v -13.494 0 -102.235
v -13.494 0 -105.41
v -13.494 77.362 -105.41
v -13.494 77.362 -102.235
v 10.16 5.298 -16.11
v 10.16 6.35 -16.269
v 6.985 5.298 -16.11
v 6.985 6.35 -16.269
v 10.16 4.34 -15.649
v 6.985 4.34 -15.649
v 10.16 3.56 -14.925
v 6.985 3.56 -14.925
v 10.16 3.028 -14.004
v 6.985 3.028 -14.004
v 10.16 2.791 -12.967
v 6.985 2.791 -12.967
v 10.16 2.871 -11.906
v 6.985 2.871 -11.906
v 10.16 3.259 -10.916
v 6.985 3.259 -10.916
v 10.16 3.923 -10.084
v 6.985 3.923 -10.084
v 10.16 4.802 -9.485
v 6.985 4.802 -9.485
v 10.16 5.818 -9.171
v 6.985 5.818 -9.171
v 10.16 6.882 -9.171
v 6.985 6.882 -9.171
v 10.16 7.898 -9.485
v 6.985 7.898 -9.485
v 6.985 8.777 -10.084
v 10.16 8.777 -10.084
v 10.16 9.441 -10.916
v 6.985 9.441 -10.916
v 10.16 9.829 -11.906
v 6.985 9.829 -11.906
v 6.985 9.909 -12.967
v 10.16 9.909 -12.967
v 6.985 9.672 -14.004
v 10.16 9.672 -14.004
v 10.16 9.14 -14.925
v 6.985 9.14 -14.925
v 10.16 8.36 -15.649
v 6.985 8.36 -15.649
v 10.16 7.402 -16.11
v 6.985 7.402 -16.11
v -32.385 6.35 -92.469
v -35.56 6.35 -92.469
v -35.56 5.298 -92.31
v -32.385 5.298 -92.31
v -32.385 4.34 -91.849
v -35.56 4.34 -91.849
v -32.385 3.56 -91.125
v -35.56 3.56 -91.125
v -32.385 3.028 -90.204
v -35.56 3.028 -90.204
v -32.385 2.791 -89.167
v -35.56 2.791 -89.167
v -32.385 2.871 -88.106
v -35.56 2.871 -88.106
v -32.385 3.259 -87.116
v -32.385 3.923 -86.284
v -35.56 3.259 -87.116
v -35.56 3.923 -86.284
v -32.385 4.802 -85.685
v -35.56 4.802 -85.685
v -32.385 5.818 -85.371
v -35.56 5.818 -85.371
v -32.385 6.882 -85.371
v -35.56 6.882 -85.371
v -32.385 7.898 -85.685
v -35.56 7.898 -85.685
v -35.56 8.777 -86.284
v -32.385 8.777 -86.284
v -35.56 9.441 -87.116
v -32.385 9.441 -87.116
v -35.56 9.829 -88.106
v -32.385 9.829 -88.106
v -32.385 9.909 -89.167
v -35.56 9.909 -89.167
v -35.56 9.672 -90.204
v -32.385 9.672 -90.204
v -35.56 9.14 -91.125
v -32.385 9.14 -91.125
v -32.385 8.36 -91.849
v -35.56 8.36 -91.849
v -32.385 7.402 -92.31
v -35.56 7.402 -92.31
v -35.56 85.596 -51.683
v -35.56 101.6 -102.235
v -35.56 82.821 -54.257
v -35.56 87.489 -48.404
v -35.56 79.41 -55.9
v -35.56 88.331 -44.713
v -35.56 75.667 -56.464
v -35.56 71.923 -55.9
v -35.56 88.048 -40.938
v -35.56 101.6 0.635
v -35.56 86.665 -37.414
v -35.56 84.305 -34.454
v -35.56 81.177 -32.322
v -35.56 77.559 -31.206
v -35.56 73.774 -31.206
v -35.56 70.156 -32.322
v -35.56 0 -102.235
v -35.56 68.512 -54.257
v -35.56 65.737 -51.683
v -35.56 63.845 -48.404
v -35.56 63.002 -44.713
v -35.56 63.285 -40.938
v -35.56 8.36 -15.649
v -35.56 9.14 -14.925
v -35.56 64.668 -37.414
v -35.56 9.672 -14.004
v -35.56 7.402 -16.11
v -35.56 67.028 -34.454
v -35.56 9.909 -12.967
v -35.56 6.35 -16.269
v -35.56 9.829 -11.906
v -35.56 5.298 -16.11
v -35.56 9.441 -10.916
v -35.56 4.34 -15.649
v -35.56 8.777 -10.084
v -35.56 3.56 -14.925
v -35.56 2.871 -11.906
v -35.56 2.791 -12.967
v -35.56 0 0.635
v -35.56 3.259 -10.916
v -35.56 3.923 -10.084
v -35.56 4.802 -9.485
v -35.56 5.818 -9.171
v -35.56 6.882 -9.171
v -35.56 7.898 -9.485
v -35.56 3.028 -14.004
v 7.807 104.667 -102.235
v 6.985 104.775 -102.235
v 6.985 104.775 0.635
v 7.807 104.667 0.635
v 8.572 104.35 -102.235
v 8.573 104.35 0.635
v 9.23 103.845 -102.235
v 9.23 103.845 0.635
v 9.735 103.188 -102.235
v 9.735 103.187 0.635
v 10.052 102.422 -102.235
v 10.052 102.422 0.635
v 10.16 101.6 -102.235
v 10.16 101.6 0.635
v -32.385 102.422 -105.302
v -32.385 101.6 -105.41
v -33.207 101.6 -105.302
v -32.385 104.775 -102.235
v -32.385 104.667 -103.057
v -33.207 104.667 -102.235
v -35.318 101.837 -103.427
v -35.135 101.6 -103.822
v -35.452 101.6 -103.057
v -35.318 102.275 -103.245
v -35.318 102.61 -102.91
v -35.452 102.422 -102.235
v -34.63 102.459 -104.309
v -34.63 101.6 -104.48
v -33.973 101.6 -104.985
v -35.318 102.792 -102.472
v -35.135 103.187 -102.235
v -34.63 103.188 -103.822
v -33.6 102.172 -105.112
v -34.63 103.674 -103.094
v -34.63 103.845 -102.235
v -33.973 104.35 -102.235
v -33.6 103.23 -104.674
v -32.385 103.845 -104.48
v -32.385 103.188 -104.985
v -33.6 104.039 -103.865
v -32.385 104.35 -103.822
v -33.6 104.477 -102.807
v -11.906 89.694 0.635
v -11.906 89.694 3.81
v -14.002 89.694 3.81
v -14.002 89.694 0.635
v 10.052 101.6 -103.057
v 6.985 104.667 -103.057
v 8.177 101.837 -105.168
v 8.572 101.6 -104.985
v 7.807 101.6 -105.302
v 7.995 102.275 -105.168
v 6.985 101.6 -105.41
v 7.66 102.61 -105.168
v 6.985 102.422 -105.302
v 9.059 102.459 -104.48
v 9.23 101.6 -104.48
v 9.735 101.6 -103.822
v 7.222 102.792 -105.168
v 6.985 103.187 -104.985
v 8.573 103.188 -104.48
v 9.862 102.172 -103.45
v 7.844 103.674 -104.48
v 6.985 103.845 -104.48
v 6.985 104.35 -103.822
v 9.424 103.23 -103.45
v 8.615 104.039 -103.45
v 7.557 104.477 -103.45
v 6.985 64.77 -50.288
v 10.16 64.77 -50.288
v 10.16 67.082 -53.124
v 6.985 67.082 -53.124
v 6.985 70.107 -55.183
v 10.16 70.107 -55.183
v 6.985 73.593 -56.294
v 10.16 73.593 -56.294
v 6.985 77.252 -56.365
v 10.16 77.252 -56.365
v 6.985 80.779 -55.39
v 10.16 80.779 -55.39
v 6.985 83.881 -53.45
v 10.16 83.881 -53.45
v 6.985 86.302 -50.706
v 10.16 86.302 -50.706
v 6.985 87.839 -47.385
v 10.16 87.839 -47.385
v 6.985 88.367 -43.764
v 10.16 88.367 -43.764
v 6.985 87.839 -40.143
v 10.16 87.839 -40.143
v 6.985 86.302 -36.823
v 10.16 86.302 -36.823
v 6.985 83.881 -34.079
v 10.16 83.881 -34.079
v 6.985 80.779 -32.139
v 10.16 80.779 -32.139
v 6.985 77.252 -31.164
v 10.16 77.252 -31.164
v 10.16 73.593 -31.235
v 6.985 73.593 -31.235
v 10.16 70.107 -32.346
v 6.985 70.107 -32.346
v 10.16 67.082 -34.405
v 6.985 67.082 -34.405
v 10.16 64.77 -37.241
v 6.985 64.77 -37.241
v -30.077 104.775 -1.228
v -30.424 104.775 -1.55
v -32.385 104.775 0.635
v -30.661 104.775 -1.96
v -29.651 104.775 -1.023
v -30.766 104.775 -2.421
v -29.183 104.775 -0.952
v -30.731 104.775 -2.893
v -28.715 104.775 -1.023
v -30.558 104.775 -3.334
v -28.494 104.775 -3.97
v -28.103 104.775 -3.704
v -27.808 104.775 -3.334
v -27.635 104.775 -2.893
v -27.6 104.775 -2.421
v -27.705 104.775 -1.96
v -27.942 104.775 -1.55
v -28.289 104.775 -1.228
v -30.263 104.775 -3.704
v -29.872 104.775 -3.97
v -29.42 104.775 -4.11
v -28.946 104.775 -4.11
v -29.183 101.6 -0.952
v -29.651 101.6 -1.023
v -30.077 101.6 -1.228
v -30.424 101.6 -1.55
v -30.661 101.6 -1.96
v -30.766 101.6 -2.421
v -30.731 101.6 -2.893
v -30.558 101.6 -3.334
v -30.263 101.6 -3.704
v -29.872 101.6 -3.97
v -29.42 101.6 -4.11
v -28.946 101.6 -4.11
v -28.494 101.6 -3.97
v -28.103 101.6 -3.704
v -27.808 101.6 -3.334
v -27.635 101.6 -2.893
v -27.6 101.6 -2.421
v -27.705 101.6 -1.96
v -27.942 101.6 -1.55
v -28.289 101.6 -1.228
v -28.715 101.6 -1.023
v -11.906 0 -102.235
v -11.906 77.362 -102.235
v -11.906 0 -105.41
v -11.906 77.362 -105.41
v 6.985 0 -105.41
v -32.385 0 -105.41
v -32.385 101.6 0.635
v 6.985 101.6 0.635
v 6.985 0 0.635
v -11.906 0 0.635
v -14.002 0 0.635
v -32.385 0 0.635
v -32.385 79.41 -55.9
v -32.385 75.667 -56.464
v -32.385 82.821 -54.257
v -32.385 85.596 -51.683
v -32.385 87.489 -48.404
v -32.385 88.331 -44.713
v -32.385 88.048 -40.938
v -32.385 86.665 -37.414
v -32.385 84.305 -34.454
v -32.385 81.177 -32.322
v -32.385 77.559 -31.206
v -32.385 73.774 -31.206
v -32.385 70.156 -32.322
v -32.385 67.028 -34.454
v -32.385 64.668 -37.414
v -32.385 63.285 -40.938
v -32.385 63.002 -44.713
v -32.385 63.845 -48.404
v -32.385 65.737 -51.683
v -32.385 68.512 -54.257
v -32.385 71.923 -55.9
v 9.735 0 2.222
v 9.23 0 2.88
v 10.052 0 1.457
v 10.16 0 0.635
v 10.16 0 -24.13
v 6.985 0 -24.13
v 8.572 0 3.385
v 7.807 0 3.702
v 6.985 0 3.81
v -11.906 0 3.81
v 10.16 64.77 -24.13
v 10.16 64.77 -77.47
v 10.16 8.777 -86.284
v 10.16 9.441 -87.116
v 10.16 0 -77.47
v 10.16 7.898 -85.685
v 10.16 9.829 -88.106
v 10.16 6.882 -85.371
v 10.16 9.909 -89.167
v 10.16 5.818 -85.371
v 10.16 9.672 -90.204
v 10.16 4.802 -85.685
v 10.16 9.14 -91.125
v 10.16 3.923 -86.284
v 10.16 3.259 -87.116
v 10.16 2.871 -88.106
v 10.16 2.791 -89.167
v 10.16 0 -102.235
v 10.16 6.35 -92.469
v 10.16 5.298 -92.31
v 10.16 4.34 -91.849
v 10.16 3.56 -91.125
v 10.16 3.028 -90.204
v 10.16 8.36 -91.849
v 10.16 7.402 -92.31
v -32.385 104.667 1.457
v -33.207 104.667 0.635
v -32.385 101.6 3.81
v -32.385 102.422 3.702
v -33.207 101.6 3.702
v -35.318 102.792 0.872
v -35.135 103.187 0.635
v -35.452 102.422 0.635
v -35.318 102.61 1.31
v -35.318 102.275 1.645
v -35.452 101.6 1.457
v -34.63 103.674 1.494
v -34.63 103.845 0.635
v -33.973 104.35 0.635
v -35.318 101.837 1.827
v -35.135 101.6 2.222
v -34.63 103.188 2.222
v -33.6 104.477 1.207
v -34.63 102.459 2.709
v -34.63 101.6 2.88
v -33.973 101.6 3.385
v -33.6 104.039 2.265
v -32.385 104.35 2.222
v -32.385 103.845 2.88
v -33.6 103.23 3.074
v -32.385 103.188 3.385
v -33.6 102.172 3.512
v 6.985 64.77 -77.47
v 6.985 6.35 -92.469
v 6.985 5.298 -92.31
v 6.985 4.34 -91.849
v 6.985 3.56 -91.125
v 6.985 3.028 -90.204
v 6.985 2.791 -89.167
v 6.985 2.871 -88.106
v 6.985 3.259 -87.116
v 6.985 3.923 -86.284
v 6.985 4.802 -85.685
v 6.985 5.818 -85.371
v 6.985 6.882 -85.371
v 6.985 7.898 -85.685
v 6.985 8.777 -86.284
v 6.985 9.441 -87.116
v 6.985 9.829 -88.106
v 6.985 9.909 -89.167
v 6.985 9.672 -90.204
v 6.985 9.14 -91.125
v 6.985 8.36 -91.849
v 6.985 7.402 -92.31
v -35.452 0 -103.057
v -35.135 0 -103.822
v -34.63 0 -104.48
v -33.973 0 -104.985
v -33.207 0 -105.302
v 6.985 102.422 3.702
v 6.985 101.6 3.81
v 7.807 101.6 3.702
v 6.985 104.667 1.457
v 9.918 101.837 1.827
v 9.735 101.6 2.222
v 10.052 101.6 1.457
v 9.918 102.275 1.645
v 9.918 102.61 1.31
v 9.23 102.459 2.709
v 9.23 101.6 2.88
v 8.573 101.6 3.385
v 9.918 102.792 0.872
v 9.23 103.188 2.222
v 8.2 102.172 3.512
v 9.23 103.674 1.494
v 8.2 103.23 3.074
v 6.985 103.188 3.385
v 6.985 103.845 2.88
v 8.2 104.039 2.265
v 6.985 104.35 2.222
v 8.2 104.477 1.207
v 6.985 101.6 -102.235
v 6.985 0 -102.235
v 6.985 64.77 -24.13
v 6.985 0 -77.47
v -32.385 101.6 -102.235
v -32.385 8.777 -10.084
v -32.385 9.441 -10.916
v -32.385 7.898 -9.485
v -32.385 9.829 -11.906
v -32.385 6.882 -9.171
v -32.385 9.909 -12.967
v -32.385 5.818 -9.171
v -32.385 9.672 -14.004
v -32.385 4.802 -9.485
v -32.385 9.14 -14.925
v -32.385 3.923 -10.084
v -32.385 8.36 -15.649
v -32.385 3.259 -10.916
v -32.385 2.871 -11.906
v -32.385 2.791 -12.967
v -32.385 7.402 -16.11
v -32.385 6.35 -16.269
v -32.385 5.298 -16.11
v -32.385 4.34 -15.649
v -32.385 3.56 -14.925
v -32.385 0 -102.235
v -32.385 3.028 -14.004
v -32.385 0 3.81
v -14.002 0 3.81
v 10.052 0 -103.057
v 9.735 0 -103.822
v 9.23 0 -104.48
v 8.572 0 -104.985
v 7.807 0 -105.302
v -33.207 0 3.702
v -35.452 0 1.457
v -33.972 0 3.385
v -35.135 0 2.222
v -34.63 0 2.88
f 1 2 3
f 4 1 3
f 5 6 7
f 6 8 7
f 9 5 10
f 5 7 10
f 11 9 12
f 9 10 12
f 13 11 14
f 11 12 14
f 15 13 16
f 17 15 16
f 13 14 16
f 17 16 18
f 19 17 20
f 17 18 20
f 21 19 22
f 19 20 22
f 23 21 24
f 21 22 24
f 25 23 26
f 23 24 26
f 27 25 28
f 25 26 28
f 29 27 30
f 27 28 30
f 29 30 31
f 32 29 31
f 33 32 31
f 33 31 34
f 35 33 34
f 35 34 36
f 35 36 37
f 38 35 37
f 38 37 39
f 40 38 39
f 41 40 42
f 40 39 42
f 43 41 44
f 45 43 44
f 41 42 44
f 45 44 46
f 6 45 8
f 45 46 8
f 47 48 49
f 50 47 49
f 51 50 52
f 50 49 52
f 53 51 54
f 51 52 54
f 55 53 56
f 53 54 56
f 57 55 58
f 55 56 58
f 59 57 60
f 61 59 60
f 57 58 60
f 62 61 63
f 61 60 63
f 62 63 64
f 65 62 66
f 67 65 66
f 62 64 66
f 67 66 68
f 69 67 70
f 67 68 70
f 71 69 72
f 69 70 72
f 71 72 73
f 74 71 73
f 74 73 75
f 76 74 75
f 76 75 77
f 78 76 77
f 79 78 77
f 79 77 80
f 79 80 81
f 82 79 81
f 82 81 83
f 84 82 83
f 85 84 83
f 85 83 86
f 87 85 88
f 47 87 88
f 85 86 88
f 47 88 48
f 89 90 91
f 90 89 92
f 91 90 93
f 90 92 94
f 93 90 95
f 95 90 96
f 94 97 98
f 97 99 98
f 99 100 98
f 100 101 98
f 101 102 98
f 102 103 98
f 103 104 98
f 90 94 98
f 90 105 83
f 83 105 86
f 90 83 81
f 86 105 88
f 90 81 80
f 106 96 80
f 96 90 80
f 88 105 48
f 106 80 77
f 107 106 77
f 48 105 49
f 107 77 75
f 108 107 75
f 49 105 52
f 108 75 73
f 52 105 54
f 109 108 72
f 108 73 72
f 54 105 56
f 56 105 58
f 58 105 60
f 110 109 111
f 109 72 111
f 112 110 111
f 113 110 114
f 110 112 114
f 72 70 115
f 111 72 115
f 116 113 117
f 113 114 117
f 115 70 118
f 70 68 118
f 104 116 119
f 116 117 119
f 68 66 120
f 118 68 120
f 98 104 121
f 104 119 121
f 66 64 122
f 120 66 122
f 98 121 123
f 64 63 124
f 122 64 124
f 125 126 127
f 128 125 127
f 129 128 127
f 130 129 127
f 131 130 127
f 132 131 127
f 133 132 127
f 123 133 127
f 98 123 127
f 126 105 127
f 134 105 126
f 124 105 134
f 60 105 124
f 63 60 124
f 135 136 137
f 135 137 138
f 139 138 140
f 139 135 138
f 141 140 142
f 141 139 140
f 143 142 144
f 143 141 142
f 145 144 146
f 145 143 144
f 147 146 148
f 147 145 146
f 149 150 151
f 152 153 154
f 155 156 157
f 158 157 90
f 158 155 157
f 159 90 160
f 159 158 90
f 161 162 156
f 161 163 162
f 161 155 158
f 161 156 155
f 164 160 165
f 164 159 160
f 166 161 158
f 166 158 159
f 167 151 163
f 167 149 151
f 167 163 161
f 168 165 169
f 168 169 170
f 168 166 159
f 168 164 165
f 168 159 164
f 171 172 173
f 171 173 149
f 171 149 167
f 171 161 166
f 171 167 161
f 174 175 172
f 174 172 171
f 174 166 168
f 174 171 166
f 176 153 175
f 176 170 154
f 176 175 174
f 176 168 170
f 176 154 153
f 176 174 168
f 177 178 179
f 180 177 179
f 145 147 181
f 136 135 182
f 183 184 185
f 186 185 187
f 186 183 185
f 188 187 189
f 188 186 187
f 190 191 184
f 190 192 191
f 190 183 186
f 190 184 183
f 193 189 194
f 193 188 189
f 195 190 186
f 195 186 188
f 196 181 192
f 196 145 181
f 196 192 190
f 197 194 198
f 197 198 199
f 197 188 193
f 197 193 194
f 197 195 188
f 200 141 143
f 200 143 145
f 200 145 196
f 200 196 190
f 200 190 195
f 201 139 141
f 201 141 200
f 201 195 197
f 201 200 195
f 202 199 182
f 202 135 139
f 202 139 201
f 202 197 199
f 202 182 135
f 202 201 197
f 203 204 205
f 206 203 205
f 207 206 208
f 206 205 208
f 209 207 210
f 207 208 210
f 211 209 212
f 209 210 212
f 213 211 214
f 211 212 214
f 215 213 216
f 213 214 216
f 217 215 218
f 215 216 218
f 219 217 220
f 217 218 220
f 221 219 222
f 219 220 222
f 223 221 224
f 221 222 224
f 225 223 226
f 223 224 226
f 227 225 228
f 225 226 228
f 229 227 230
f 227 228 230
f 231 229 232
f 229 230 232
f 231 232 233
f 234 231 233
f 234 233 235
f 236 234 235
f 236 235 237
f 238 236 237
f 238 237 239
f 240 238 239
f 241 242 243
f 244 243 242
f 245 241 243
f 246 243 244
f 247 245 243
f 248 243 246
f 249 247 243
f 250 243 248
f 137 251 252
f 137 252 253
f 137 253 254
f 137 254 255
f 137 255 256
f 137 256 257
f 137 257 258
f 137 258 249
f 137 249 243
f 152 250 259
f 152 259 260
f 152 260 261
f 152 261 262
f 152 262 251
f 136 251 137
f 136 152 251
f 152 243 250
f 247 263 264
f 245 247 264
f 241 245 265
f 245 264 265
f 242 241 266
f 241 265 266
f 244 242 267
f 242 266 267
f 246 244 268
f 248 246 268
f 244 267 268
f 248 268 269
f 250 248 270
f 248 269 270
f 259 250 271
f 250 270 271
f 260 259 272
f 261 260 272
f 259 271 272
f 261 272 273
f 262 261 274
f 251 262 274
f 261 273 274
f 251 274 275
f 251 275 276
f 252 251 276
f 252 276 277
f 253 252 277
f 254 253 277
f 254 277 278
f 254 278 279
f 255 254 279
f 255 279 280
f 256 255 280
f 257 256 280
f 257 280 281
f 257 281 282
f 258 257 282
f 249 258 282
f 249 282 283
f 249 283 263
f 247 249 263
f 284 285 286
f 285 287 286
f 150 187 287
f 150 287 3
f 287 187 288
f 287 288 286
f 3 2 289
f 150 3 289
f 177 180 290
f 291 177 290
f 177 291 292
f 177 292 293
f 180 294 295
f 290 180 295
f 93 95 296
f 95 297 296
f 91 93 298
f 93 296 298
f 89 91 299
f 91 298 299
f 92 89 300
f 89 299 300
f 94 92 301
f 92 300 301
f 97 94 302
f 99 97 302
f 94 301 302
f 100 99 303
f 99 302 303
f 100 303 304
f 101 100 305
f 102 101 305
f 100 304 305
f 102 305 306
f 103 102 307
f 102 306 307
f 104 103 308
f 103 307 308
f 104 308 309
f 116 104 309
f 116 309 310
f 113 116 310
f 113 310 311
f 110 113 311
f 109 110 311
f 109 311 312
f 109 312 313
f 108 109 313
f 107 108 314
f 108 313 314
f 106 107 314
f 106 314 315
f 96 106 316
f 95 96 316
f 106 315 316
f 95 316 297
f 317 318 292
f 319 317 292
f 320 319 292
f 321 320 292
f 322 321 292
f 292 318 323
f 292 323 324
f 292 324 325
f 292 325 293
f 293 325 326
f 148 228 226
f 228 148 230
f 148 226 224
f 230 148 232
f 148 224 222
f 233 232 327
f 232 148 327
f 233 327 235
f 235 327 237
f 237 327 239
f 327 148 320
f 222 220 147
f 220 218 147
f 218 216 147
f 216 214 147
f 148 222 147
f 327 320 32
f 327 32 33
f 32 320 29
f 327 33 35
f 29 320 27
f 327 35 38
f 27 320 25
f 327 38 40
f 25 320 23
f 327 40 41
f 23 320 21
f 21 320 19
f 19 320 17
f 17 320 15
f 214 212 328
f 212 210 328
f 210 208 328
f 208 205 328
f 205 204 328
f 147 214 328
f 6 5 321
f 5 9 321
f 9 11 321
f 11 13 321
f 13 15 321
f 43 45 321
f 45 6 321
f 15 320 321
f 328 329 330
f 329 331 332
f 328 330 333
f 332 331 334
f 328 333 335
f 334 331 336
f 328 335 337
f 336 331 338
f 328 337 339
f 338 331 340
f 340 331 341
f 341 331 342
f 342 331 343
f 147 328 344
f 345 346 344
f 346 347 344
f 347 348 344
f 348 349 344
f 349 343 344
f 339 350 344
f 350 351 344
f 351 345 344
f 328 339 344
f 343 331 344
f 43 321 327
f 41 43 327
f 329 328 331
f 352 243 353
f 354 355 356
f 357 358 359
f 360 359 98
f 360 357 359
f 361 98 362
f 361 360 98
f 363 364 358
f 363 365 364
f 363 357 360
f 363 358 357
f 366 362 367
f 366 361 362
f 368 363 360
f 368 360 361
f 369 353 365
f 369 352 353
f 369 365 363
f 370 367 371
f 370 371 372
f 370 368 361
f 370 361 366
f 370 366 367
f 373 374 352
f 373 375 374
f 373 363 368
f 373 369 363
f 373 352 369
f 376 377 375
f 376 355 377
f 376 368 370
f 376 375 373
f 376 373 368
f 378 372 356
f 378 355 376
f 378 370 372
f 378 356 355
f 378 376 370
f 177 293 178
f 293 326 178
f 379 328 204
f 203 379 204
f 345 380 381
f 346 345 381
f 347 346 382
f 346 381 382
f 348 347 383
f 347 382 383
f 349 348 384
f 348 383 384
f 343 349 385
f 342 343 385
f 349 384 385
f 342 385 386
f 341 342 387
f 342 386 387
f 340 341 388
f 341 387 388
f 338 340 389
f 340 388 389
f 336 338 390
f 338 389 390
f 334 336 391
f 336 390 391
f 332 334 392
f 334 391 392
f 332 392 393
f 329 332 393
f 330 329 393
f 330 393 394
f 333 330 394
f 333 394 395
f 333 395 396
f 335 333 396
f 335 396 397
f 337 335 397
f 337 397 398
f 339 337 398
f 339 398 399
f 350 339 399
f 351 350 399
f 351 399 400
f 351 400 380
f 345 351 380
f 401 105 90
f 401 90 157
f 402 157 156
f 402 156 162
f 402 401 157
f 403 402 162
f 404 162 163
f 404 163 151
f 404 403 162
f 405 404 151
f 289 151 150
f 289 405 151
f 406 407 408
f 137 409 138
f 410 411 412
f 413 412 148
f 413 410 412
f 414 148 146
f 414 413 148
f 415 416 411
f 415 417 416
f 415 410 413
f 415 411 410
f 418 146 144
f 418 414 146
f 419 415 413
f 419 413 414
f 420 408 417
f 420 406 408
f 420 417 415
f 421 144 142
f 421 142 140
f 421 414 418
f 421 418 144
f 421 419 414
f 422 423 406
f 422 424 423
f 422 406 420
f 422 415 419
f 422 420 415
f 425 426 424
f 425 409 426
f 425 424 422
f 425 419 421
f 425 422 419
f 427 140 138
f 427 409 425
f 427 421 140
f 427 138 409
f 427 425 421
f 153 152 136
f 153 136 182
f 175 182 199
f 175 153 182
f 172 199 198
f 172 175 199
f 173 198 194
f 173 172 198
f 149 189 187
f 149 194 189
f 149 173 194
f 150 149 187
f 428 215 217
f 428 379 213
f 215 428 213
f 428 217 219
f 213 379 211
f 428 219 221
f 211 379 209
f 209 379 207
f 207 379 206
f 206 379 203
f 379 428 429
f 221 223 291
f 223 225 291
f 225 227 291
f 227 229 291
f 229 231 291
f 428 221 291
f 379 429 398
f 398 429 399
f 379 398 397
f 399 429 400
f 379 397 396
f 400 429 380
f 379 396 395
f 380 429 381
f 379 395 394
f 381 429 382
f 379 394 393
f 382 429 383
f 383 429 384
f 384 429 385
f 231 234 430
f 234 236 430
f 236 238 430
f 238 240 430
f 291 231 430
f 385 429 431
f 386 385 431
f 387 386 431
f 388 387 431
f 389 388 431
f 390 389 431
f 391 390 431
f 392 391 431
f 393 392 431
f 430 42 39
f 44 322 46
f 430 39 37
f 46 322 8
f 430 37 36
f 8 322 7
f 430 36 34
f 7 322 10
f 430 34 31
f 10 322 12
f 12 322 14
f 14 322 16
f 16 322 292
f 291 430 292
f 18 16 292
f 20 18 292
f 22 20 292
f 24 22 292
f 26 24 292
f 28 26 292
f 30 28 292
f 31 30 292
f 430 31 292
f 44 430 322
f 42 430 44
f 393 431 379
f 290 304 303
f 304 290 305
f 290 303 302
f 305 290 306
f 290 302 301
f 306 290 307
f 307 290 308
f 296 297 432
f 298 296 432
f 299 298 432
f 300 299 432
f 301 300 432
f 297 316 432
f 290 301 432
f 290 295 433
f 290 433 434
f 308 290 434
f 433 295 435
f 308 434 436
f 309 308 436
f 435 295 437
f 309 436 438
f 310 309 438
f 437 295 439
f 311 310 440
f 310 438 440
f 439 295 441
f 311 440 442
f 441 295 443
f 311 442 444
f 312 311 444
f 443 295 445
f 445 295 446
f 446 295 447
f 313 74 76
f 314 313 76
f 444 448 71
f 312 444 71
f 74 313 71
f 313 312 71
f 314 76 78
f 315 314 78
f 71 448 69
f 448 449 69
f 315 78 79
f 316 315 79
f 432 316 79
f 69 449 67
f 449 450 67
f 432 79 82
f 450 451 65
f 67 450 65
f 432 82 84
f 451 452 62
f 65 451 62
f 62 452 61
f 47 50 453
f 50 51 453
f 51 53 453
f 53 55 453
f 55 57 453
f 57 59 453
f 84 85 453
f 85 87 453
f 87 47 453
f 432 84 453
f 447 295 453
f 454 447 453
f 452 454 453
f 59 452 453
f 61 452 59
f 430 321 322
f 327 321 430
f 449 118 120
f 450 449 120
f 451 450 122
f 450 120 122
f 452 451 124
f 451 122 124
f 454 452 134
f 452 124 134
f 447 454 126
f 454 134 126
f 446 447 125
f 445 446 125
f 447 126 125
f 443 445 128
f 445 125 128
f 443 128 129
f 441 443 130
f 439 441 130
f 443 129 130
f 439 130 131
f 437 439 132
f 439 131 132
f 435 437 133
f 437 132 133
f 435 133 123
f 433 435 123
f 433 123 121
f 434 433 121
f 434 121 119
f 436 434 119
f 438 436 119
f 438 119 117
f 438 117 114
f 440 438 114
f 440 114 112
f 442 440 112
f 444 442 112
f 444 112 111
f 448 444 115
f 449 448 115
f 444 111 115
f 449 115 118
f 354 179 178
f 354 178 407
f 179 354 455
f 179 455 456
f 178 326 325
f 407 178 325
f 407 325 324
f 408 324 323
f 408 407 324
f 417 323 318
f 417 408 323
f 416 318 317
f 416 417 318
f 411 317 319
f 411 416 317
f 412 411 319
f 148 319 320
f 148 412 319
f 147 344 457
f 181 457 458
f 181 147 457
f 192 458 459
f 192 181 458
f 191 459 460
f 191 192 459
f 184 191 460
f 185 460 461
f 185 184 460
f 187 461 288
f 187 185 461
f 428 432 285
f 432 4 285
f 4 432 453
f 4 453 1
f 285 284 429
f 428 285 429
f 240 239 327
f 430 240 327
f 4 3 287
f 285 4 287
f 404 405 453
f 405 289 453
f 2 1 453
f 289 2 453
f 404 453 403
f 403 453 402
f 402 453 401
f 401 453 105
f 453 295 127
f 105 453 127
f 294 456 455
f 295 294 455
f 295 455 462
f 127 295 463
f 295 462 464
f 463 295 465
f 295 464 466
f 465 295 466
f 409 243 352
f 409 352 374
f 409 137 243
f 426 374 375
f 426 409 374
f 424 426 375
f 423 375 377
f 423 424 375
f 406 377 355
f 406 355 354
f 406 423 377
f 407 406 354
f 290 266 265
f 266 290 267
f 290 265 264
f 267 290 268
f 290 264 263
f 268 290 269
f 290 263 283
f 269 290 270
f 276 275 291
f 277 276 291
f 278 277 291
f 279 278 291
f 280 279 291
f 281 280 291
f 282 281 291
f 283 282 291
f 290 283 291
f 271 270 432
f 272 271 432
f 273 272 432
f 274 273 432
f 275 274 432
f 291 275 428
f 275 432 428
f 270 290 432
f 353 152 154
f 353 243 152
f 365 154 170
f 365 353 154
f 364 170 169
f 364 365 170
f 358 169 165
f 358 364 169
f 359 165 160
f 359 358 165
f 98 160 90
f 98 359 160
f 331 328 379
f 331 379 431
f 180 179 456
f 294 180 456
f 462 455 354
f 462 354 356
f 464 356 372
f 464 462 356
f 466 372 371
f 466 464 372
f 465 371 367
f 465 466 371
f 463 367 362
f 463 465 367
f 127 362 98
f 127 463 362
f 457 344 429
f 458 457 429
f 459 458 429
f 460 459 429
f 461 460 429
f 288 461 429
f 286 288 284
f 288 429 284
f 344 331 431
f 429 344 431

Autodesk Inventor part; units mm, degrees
ref_plane "YZ Plane" through (0, 0, 0) normal (1, 0, 0) x (0, 1, 0)
ref_plane "XZ Plane" through (0, 0, 0) normal (0, 1, 0) x (-1, 0, 0)
ref_plane "XY Plane" through (0, 0, 0) normal (0, 0, 1) x (1, 0, 0)
sketch "Sketch1" plane through (0, 0, 0) normal (0, 1, 0) x (-1, 0, 0)
  line L0 (0, 0) -> (25.4, 0)
  line L1 (25.4, 0) -> (25.4, -101.6)
  line L2 (25.4, -101.6) -> (0, -101.6)
  line L3 (0, -101.6) -> (0, 0)
  line L4 (25.4, 0) -> (31.75, 0)
  line L5 (31.75, 0) -> (31.75, -101.6)
  line L6 (31.75, -101.6) -> (25.4, -101.6)
  line L7 (25.4, -101.6) -> (25.4, 0)
  line L8 (0, -101.6) -> (-6.35, -101.6)
  line L9 (-6.35, -101.6) -> (-6.35, 0)
  line L10 (-6.35, 0) -> (0, 0)
  line L11 (0, 0) -> (0, -101.6)
  line L12 (-6.985, 0.635) -> (32.385, 0.635)
  line L13 (32.385, 0.635) -> (32.385, -102.235)
  line L14 (32.385, -102.235) -> (-6.985, -102.235)
  line L15 (-6.985, -102.235) -> (-6.985, 0.635)
  line L16 (-6.985, 0.635) -> (32.385, -102.235) construction
  line L17 (32.385, 0.635) -> (-6.985, -102.235) construction
  line L18 (-10.16, 3.81) -> (35.56, 3.81)
  line L19 (35.56, 3.81) -> (35.56, -105.41)
  line L20 (35.56, -105.41) -> (-10.16, -105.41)
  line L21 (-10.16, -105.41) -> (-10.16, 3.81)
  line L22 (-10.16, 3.81) -> (35.56, -105.41) construction
  line L23 (35.56, 3.81) -> (-10.16, -105.41) construction
  point P0 (12.7, -50.8)
  dimension "d0" = 25.4
  dimension "d1" = 101.6
  dimension "d2" = 6.35
  dimension "d3" = 6.35
  dimension "d4" = 39.37
  dimension "d5" = 102.87
  dimension "d6" = 45.72
  dimension "d7" = 109.22
extrude "Extrusion1" add sketch "Sketch1" along normal blind 101.6 contours L18 L19 L20 L21
sketch "Sketch2" plane through (10.16, 0, 3.81) normal (1, 0, 0) x (0, 0, -1)
  line L0 (109.22, 0) -> (109.22, 101.6) projected
  line L1 (109.22, 0) -> (92.71, 0)
  line L2 (92.71, 0) -> (92.71, 6.35)
  line L3 (92.71, 6.35) -> (109.22, 6.35)
  line L4 (109.22, 6.35) -> (109.22, 0)
  line L5 (106.045, 0) -> (3.175, 0) projected
  line L6 (54.61, 0) -> (54.61, 12.7)
  line L7 (54.61, 12.7) -> (54.61, 63.5)
  line L8 (27.94, 11.43) -> (81.28, 11.43)
  line L9 (81.28, 11.43) -> (81.28, 64.77)
  line L10 (81.28, 64.77) -> (27.94, 64.77)
  line L11 (27.94, 64.77) -> (27.94, 11.43)
  line L12 (27.94, 11.43) -> (81.28, 64.77) construction
  line L13 (81.28, 11.43) -> (27.94, 64.77) construction
  line L14 (27.94, 11.43) -> (81.28, 11.43)
  line L15 (81.28, 11.43) -> (81.28, 0)
  line L16 (81.28, 0) -> (27.94, 0)
  line L17 (27.94, 0) -> (27.94, 11.43)
  line L18 (106.045, 101.6) -> (3.175, 101.6) projected
  line L19 (54.61, 101.6) -> (54.61, 75.6666)
  line L20 (54.61, 101.6) -> (80.5434, 101.6) construction
  line L21 (54.61, 75.6666) -> (47.5742, 75.6666)
  circle A0 centre (47.5742, 75.6666) radius 12.7
  line L22 (0, 0) -> (0, 101.6) projected
  line L23 (0, 0) -> (16.51, 0)
  line L24 (16.51, 0) -> (16.51, 6.35)
  line L25 (16.51, 6.35) -> (0, 6.35)
  line L26 (0, 6.35) -> (0, 0)
  point P0 (3.81, 0)
  point P1 (25.4, 6.35)
  point P2 (54.61, 38.1)
  point P3 (41.0508, 64.77)
  point P4 (54.0976, 64.77)
  dimension "d12" = 16.51
  dimension "d13" = 6.35
  dimension "d14" = 12.7
  dimension "d15" = 50.8
  dimension "d16" = 53.34
  dimension "d17" = 53.34
  dimension "d30" = 25.9334
  dimension "d31" = 90
  dimension "d37" = 7.0358
  dimension "d38" = 25.4
  dimension "d48" = 16.51
  dimension "d49" = 6.35
extrude "Extrusion2" cut sketch "Sketch2" against normal blind 3.175 contours L5 L6 L8 L15 | L5 L17 L8 L6 | L8 L11 L10 A0 L9 | A0 L10 picked at (46.2278, 64.3887)
hole "Hole1" at (10.16, 6.35, -88.9) at (10.16, 6.35, -12.7) direction (-1, 0, 0) diameter 7.1374 end through all clearance for "Socket Head Cap Screw" size "1/4" standard "Ansi Unified Screw Threads"
sketch "Sketch3" plane through (0, 101.6, 0) normal (0, 1, 0) x (1, 0, 0)
  line L0 (10.16, -3.81) -> (10.16, 105.41) projected
  line L1 (-35.56, -3.81) -> (10.16, -3.81)
  line L2 (10.16, -3.81) -> (10.16, 105.41)
  line L3 (10.16, 105.41) -> (-35.56, 105.41)
  line L4 (-35.56, 105.41) -> (-35.56, -3.81)
  point P0 (0, 0)
extrude "Extrusion3" add sketch "Sketch3" along normal blind 3.175
fillet "Fillet1" radius 3.175 8 edges at (-12.7, 104.775, 3.81) (10.16, 52.3875, 3.81) (10.16, 104.775, -50.8) (-12.7, 104.775, -105.41) (10.16, 52.3875, -105.41) (-35.56, 104.775, -50.8) (-35.56, 52.3875, 3.81) (-35.56, 52.3875, -105.41)
extrude "Extrusion4" cut sketch "Sketch2" against normal through all contours A0 L10 | L10 A0
sketch "Sketch4" plane through (0, 104.775, 0) normal (0, 1, 0) x (1, 0, 0)
  line L0 (-32.3579, -0.635) -> (-29.1829, -0.635)
  line L1 (-29.1829, -0.635) -> (-29.1829, 2.54)
  line L2 (-29.1829, 2.54) -> (-32.3579, 2.54)
  line L3 (-32.3579, 2.54) -> (-32.3579, -0.635)
  point P0 (0, 0)
  dimension "d39" = 3.175
  dimension "d40" = 3.175
hole "Hole2" at (-29.1829, 104.775, -2.54) direction (0, -1, 0) diameter 3.175 end through all
sketch "Sketch5" plane through (6.985, 0, -105.41) normal (0, 0, -1) x (-1, 0, 0)
  line L0 (-3.175, 64.77) -> (-3.175, 88.3666) projected
  line L1 (0, 88.3666) -> (0, 64.77) projected
  line L2 (0, 76.5683) -> (19.685, 76.5683)
  line L3 (39.37, 0) -> (39.37, 101.6) projected
  line L4 (15.5575, 72.4408) -> (23.8125, 72.4408)
  line L5 (23.8125, 72.4408) -> (23.8125, 80.6958)
  line L6 (23.8125, 80.6958) -> (15.5575, 80.6958)
  line L7 (15.5575, 80.6958) -> (15.5575, 72.4408)
  line L8 (15.5575, 72.4408) -> (23.8125, 80.6958) construction
  line L9 (23.8125, 72.4408) -> (15.5575, 80.6958) construction
  line L10 (19.685, 76.5683) -> (20.4788, 76.5683)
  line L11 (20.4788, 76.5683) -> (20.4788, 77.3621)
  line L12 (20.4788, 77.3621) -> (19.685, 77.3621)
  line L13 (19.685, 77.3621) -> (19.685, 76.5683)
  line L14 (20.4788, 77.3621) -> (18.8913, 77.3621)
  line L15 (18.8913, 77.3621) -> (18.8913, -14.0779)
  line L16 (18.8913, -14.0779) -> (20.4788, -14.0779)
  line L17 (20.4788, -14.0779) -> (20.4788, 77.3621)
  point P0 (6.985, 0)
  dimension "d50" = 19.685
  dimension "d51" = 8.255
  dimension "d52" = 8.255
  dimension "d62" = 0.7937
  dimension "d63" = 0.7937
  dimension "d64" = 1.5875
  dimension "d65" = 91.44
extrude "Extrusion5" cut sketch "Sketch5" against normal blind 6.35 contours L15 L14 L13 L2 | L2 L10 L17 L4 L15 | L13 L12 L11 L10 | L4 L17 L16 L15
sketch "Sketch6" plane through (-32.385, 0, 3.81) normal (0, 0, 1) x (1, 0, 0)
  line L0 (0, 101.6) -> (39.37, 101.6) projected
  line L1 (19.685, 101.6) -> (19.685, 88.9)
  line L2 (19.685, 88.9) -> (19.685, 89.6938)
  line L3 (19.685, 89.6938) -> (20.4788, 89.6938)
  line L4 (20.4788, 89.6938) -> (18.3833, 89.6938)
  line L5 (18.3833, 89.6938) -> (18.3832, -1.7462)
  line L6 (18.3832, -1.7462) -> (20.4787, -1.7462)
  line L7 (20.4787, -1.7462) -> (20.4788, 89.6938)
  point P0 (32.385, 0)
  dimension "d55" = 12.7
  dimension "d56" = 0.7937
  dimension "d57" = 0.7937
  dimension "d58" = 2.0955
  dimension "d59" = 91.44
extrude "Extrusion6" cut sketch "Sketch6" against normal blind 6.35
properties part number "ThermalOvershield"
